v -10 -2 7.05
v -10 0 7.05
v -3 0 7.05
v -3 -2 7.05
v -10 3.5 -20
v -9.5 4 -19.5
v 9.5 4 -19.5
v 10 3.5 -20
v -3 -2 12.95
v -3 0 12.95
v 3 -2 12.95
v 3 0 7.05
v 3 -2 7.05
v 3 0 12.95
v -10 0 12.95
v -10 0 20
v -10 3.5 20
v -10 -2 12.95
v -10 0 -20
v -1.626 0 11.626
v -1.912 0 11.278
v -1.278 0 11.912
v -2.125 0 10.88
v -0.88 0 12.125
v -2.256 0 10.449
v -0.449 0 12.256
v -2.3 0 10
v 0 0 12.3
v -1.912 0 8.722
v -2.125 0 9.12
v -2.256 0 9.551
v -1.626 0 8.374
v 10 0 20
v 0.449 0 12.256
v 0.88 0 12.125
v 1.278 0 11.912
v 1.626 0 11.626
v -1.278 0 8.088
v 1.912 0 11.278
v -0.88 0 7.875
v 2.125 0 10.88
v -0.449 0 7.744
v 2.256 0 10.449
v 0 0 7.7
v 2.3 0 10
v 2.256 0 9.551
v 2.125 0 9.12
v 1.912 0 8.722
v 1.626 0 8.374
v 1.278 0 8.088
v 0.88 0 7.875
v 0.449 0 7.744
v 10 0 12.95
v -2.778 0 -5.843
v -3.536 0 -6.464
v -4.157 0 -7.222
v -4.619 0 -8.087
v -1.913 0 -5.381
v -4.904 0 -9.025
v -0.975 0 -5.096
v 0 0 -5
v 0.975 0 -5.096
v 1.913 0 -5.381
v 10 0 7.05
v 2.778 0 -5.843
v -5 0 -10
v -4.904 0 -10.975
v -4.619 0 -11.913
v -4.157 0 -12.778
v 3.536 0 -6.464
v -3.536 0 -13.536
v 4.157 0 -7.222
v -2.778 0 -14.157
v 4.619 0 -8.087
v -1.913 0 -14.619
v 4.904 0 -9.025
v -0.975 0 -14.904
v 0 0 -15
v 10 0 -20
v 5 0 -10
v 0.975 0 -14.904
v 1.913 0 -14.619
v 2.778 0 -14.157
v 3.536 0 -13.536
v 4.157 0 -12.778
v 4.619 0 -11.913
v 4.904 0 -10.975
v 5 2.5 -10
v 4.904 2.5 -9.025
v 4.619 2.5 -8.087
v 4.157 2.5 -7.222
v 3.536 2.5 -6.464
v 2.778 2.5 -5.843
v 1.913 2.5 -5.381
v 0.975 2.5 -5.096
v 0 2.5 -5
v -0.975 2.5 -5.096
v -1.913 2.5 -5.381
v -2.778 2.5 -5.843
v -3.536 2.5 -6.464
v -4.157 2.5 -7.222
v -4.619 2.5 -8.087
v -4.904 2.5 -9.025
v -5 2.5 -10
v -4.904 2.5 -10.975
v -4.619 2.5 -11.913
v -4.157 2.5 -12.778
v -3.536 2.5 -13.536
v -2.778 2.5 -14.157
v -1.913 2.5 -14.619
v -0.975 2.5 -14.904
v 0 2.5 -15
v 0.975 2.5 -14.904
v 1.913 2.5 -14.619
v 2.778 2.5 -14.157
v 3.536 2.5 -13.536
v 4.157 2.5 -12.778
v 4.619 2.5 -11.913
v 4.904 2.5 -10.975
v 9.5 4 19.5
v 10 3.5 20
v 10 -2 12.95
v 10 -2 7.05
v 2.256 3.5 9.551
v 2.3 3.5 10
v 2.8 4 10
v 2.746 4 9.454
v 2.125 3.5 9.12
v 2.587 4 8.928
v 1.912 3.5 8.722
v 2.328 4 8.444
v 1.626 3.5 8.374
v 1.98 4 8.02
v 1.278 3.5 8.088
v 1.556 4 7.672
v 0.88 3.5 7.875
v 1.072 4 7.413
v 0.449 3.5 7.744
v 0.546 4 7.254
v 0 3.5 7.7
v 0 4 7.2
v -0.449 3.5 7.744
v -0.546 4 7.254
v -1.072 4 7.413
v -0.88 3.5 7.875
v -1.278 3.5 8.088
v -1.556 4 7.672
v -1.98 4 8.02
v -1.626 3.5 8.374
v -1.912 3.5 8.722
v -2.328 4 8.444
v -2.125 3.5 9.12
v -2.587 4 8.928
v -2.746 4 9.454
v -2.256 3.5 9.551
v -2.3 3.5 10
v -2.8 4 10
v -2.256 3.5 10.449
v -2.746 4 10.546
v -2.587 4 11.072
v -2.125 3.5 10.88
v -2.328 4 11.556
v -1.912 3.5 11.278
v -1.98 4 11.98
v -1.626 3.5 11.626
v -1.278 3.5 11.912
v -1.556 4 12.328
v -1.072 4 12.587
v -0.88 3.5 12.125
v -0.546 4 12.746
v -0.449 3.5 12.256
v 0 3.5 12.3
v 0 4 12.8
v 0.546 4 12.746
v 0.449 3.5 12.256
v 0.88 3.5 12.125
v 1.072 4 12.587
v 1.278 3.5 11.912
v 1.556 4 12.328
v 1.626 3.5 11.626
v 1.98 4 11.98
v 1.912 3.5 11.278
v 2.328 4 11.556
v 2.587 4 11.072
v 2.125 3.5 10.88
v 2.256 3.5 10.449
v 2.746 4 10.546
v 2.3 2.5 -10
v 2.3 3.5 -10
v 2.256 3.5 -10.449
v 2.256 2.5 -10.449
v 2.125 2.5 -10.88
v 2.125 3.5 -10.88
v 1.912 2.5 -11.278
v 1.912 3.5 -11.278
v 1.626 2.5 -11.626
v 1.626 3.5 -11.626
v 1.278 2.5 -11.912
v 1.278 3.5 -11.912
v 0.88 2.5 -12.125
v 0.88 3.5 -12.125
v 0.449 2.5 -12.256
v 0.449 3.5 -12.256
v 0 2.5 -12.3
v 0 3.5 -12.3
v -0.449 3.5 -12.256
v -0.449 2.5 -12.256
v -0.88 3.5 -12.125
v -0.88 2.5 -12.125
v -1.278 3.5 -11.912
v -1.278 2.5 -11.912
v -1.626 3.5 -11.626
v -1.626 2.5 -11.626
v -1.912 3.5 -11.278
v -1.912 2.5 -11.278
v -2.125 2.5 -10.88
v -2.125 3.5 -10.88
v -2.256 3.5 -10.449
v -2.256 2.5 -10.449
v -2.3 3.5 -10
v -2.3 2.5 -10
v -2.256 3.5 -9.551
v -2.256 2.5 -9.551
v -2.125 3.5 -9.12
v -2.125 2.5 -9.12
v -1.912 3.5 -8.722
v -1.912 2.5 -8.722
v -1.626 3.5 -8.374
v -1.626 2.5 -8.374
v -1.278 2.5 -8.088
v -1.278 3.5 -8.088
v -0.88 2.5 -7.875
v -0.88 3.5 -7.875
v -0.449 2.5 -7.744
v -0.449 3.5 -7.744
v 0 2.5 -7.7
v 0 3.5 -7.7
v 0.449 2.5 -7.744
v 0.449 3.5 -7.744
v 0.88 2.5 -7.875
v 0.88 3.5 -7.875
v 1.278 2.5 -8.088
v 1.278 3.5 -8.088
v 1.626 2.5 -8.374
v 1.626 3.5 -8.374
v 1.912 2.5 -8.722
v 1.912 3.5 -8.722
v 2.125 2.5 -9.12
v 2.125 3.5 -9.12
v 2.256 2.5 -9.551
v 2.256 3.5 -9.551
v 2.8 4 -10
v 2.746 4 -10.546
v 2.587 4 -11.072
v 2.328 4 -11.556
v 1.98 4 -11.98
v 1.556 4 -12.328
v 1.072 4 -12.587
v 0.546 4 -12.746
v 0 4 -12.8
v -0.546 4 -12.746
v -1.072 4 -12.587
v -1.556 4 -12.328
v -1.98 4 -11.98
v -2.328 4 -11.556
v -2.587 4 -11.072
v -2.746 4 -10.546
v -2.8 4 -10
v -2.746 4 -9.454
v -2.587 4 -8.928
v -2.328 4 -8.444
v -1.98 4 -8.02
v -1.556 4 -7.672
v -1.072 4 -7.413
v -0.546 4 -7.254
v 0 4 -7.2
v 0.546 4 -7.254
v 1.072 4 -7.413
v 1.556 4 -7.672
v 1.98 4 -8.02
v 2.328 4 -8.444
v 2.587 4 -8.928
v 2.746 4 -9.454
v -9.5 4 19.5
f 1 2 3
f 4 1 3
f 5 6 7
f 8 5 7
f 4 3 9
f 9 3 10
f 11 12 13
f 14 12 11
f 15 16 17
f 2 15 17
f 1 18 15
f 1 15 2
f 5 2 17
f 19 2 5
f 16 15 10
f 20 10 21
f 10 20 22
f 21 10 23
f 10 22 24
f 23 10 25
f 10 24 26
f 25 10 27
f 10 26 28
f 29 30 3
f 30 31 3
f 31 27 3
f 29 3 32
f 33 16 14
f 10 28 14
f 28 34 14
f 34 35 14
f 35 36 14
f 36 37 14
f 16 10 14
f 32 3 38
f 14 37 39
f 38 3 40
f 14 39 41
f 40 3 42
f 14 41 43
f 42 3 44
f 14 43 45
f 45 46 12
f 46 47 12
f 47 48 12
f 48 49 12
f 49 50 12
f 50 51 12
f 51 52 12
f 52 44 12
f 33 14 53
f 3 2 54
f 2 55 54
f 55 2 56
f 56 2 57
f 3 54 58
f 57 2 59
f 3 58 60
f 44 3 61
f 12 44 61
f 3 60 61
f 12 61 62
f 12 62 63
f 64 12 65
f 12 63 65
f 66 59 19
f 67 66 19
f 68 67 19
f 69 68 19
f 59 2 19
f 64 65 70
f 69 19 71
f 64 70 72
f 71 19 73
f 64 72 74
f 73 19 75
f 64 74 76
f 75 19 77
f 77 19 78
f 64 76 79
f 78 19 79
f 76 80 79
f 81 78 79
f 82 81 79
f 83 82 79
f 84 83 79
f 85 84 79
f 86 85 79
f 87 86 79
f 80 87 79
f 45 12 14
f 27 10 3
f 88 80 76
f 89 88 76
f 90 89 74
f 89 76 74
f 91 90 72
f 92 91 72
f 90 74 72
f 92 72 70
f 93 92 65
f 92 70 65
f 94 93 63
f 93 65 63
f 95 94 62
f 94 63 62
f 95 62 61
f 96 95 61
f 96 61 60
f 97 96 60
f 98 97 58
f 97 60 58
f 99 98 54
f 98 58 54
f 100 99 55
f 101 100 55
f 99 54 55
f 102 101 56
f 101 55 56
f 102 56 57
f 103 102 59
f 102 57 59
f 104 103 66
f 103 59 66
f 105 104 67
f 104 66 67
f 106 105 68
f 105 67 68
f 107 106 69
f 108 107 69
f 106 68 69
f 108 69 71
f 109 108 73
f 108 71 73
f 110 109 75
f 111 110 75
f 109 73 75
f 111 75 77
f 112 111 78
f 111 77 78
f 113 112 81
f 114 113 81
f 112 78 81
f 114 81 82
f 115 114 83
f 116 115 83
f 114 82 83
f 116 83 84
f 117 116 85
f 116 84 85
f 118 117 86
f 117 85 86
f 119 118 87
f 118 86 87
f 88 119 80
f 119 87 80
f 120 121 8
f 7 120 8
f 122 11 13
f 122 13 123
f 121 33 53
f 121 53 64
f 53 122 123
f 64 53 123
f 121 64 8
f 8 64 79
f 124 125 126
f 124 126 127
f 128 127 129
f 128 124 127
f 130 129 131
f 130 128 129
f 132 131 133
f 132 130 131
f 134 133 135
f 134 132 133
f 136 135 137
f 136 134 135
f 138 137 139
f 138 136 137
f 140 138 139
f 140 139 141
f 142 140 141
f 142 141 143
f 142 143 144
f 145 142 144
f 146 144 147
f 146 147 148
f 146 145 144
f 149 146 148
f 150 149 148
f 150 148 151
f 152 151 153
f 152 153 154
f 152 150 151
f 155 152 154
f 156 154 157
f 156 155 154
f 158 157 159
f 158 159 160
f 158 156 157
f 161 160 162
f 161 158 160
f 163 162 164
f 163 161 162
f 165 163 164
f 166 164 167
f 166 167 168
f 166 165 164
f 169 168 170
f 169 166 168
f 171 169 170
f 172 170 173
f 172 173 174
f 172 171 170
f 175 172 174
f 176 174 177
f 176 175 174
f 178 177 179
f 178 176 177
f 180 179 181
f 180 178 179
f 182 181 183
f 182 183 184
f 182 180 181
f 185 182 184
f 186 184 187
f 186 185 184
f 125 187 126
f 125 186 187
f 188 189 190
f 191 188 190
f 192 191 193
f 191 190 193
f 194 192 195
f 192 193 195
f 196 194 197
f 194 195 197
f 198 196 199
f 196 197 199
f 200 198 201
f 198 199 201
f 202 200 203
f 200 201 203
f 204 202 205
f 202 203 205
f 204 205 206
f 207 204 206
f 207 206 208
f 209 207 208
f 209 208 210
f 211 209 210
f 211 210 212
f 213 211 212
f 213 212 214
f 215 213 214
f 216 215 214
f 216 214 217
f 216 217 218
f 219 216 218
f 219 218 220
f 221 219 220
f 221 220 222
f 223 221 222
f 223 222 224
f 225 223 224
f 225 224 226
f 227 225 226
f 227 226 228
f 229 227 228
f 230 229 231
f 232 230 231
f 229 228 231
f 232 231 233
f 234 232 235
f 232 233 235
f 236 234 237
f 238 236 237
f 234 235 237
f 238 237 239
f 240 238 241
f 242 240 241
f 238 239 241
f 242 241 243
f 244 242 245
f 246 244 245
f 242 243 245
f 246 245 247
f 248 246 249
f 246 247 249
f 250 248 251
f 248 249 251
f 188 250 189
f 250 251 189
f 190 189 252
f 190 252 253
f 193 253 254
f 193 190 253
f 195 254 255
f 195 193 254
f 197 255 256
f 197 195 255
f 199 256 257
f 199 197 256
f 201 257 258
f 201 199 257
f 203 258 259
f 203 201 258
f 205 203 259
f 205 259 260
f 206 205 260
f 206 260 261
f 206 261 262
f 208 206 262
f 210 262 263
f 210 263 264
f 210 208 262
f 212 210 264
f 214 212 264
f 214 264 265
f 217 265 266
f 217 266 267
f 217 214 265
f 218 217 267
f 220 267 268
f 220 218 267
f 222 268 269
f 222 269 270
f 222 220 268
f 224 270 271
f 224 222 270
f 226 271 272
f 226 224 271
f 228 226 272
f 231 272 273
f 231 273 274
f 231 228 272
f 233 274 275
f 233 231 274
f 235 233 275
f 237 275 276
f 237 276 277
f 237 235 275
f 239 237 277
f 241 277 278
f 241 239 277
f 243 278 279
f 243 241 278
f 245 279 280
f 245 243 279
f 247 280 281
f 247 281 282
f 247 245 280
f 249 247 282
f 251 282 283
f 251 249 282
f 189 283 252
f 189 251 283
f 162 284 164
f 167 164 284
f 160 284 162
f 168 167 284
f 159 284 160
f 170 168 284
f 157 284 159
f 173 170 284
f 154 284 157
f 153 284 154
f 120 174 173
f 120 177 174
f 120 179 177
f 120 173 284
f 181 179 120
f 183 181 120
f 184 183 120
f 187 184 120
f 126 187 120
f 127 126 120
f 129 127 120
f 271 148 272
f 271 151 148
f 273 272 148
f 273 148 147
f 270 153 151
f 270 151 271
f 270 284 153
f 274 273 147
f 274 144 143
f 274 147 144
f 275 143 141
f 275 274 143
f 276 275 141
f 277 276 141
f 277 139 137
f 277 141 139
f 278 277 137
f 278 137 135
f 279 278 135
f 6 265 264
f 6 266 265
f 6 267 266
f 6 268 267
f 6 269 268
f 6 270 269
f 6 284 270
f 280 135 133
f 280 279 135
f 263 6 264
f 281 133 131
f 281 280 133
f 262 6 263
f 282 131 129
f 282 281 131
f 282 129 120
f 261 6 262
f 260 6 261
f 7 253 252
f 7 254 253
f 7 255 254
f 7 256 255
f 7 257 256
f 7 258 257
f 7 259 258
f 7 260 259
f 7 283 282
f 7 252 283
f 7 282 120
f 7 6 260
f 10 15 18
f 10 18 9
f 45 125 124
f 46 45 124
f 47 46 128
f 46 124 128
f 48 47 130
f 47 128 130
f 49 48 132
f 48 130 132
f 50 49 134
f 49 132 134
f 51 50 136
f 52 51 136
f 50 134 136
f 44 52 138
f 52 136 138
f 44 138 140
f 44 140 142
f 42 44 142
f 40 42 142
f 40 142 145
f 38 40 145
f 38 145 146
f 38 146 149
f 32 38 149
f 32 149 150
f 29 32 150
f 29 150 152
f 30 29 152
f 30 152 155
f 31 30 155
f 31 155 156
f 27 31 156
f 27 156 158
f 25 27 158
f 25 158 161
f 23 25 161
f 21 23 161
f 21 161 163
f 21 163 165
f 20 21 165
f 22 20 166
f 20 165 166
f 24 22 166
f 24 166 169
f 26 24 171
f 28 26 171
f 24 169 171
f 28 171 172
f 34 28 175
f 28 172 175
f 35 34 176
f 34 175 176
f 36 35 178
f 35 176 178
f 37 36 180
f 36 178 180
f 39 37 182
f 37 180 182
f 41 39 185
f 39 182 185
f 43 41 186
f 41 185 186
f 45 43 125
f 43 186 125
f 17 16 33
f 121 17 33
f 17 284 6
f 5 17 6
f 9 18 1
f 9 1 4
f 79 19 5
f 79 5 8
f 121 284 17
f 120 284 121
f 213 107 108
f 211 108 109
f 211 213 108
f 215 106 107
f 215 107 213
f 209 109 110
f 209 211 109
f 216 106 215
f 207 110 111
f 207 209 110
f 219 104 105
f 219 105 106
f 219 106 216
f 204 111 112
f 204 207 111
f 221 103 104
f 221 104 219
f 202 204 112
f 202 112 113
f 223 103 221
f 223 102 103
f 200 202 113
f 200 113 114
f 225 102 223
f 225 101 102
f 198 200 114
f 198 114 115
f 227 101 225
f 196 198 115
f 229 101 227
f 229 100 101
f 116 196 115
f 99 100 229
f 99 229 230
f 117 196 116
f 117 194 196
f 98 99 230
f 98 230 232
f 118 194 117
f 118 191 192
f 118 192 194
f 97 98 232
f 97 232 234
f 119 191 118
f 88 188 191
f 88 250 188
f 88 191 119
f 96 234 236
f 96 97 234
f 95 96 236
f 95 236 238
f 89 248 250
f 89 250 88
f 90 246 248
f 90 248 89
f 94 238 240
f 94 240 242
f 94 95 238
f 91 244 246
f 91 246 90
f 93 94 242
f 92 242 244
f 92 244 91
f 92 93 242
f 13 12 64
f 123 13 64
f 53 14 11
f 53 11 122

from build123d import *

# Parameters (mm, degrees)
ESBO_O1_W                  = 20
ESBO_O1_H                  = 40
RESSALTO_EXTRUS_O1_DEPTH   = 4
ESBO_O2_R                  = 2.3
CORTE_EXTRUS_O1_DEPTH      = 1
CORTE_EXTRUS_O1_DEPTH_BACK = 5
ESBO_O3_W                  = 7
ESBO_O3_H                  = 5.9
RESSALTO_EXTRUS_O2_DEPTH   = 2
CHANFRO1_SIZE              = 0.5
ESBO_O4_R                  = 5
CORTE_EXTRUS_O2_DEPTH      = 2.5


with BuildPart() as part:
    # Esboço1 → Ressalto-extrusão1 (new body)
    with BuildSketch(Plane(origin=(0, 0, 0), x_dir=(1, 0, 0), z_dir=(0, 1, 0))):
        Rectangle(ESBO_O1_W, ESBO_O1_H)
    extrude(amount=RESSALTO_EXTRUS_O1_DEPTH)

    # Esboço2 → Corte-extrusão1 (cut, two sides)
    with BuildSketch(Plane(origin=(0, 4, 0), x_dir=(1, 0, 0), z_dir=(0, 1, 0))) as corte_extrus_o1_sk:
        with Locations((0, 10)):
            Circle(ESBO_O2_R)
        with Locations((0, -10)):
            Circle(ESBO_O2_R)
    extrude(amount=CORTE_EXTRUS_O1_DEPTH, mode=Mode.SUBTRACT)
    extrude(corte_extrus_o1_sk.sketch, amount=-CORTE_EXTRUS_O1_DEPTH_BACK, mode=Mode.SUBTRACT)

    # Esboço3 → Ressalto-extrusão2 (add)
    with BuildSketch(Plane.XZ):
        with Locations((6.5, 10)):
            Rectangle(ESBO_O3_W, ESBO_O3_H)
        with Locations((-6.5, 10)):
            Rectangle(ESBO_O3_W, ESBO_O3_H)
    extrude(amount=RESSALTO_EXTRUS_O2_DEPTH)

    # Chanfro1
    chanfro1_edges = [part.edges().sort_by_distance(p)[0] for p in [
        (-10, 4, 0),
        (0, 4, 20),
        (-2.3, 4, -10),
        (-2.3, 4, 10),
        (10, 4, 0),
        (0, 4, -20),
    ]]
    chamfer(chanfro1_edges, length=CHANFRO1_SIZE)

    # Esboço4 → Corte-extrusão2 (cut)
    with BuildSketch(Plane.XZ):
        with Locations((0, -10)):
            Circle(ESBO_O4_R)
    extrude(amount=-CORTE_EXTRUS_O2_DEPTH, mode=Mode.SUBTRACT)


solid = part.part
